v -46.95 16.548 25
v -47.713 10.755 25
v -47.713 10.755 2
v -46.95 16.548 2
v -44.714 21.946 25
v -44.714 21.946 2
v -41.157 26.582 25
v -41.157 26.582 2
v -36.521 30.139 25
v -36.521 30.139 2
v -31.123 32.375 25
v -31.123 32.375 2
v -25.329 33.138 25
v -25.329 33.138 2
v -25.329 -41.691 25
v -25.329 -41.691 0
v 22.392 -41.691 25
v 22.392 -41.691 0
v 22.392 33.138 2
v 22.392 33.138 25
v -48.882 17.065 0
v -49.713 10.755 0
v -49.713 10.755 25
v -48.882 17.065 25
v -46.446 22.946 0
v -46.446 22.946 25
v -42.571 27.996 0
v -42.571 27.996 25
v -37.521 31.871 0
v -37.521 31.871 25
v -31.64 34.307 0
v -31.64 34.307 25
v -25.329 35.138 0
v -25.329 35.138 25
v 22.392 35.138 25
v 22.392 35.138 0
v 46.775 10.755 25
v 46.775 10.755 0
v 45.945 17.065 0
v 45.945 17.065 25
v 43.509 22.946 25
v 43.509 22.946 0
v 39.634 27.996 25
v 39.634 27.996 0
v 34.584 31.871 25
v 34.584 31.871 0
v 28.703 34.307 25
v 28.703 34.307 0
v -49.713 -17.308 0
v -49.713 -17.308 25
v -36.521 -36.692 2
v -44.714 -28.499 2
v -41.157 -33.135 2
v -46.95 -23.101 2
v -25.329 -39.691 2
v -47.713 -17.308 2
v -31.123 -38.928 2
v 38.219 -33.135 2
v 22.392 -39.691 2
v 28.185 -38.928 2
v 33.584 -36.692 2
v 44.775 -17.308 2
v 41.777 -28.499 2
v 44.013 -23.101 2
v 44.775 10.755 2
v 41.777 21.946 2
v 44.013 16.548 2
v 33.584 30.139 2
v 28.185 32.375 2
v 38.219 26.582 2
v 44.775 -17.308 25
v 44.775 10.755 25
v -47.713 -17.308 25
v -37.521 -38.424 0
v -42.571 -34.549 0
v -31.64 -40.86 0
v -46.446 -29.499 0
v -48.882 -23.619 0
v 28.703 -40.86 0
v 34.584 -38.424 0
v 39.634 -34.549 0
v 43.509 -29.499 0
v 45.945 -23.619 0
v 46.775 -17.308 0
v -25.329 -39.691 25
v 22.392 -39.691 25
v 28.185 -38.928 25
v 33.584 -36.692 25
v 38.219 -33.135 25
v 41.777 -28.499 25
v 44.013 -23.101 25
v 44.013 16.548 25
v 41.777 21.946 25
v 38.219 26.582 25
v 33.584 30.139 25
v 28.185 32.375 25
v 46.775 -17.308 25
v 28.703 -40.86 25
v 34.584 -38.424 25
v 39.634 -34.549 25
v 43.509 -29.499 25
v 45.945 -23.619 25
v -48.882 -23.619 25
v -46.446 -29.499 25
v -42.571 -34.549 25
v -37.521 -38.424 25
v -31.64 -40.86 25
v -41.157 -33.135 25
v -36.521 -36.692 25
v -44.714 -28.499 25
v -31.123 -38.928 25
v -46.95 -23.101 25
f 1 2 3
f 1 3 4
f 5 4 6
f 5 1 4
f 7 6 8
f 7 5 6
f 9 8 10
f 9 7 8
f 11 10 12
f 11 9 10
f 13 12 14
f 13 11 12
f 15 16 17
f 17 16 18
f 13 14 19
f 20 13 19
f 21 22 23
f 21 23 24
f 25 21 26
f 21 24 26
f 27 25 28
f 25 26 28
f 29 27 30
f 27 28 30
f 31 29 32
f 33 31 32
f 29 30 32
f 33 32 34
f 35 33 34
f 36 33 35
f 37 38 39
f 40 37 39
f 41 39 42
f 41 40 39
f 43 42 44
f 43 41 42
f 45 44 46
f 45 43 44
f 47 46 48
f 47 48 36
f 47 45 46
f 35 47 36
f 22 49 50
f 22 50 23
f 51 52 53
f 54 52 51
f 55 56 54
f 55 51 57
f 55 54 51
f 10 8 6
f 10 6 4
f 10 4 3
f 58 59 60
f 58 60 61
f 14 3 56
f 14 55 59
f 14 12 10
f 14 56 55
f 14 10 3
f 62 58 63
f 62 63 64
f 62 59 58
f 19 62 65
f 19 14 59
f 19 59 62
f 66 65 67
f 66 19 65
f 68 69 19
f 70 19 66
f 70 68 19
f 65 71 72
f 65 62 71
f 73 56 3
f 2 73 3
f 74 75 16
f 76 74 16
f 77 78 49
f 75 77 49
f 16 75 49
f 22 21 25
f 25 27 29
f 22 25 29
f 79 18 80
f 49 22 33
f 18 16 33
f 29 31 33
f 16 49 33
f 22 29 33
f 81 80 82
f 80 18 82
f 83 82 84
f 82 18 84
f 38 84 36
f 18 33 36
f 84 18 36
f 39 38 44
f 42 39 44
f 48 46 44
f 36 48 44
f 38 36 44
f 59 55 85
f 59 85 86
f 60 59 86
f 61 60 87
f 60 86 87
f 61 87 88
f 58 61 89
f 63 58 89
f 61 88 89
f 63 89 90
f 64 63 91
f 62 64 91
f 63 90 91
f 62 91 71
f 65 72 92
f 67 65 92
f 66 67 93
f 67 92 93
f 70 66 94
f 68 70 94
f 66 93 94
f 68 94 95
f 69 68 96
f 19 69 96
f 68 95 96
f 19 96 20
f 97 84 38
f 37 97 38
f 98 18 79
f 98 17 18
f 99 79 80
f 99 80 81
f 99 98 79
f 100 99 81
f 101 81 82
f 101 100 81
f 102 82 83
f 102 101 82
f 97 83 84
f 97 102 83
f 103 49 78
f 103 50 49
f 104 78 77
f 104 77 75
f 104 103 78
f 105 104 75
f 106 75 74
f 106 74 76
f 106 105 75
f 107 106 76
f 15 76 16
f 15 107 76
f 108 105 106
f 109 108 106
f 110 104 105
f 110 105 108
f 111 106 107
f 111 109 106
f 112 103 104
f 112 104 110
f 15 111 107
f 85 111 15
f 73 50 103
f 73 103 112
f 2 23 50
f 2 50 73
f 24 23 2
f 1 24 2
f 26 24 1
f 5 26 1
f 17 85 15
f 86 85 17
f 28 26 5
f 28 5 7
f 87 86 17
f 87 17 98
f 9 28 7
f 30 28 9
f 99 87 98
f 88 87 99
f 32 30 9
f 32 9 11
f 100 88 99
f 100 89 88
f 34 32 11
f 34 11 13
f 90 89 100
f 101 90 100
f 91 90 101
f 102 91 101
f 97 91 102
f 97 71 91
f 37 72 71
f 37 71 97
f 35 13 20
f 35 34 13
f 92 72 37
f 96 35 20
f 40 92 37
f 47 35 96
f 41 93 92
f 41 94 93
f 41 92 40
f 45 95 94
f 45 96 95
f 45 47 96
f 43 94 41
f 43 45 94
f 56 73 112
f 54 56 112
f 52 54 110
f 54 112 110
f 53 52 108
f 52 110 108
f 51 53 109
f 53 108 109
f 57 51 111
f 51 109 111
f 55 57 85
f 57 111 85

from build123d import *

# Parameters (mm, degrees)
F0_W     = 96.488521
F0_H     = 76.829273
F1_DEPTH = 25
F2_R     = 24.383557
F3_T     = -2


with BuildPart() as f1:
    # F0 (on Top) → F1 (new body)
    with BuildSketch(Plane.XY):
        with Locations((-1.468796, -3.276543)):
            Rectangle(F0_W, F0_H)
    extrude(amount=F1_DEPTH)

    # F2
    f2_edges = [f1.edges().sort_by_distance(p)[0] for p in [
        (46.775464, -41.69118, 12.5),
        (46.775464, 35.138093, 12.5),
        (-49.713057, 35.138093, 12.5),
        (-49.713057, -41.69118, 12.5),
    ]]
    fillet(f2_edges, radius=F2_R)

    # F3
    f3_openings = [f1.faces().sort_by_distance(p)[0] for p in [
        (-1.468796, -3.276544, 25),
    ]]
    offset(amount=F3_T, openings=f3_openings)


solid = f1.part
